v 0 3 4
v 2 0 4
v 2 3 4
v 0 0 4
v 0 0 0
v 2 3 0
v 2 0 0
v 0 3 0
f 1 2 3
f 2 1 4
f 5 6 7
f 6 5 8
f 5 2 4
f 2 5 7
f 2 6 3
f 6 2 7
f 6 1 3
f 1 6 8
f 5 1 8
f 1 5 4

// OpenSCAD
/* ****** ****** */
/*
Let's draw a cuboid
*/
/* ****** ****** */

cube([2,3,4]); // x=2, y=3, z=4

/* ****** ****** */

/* end of [test01.scad] */
